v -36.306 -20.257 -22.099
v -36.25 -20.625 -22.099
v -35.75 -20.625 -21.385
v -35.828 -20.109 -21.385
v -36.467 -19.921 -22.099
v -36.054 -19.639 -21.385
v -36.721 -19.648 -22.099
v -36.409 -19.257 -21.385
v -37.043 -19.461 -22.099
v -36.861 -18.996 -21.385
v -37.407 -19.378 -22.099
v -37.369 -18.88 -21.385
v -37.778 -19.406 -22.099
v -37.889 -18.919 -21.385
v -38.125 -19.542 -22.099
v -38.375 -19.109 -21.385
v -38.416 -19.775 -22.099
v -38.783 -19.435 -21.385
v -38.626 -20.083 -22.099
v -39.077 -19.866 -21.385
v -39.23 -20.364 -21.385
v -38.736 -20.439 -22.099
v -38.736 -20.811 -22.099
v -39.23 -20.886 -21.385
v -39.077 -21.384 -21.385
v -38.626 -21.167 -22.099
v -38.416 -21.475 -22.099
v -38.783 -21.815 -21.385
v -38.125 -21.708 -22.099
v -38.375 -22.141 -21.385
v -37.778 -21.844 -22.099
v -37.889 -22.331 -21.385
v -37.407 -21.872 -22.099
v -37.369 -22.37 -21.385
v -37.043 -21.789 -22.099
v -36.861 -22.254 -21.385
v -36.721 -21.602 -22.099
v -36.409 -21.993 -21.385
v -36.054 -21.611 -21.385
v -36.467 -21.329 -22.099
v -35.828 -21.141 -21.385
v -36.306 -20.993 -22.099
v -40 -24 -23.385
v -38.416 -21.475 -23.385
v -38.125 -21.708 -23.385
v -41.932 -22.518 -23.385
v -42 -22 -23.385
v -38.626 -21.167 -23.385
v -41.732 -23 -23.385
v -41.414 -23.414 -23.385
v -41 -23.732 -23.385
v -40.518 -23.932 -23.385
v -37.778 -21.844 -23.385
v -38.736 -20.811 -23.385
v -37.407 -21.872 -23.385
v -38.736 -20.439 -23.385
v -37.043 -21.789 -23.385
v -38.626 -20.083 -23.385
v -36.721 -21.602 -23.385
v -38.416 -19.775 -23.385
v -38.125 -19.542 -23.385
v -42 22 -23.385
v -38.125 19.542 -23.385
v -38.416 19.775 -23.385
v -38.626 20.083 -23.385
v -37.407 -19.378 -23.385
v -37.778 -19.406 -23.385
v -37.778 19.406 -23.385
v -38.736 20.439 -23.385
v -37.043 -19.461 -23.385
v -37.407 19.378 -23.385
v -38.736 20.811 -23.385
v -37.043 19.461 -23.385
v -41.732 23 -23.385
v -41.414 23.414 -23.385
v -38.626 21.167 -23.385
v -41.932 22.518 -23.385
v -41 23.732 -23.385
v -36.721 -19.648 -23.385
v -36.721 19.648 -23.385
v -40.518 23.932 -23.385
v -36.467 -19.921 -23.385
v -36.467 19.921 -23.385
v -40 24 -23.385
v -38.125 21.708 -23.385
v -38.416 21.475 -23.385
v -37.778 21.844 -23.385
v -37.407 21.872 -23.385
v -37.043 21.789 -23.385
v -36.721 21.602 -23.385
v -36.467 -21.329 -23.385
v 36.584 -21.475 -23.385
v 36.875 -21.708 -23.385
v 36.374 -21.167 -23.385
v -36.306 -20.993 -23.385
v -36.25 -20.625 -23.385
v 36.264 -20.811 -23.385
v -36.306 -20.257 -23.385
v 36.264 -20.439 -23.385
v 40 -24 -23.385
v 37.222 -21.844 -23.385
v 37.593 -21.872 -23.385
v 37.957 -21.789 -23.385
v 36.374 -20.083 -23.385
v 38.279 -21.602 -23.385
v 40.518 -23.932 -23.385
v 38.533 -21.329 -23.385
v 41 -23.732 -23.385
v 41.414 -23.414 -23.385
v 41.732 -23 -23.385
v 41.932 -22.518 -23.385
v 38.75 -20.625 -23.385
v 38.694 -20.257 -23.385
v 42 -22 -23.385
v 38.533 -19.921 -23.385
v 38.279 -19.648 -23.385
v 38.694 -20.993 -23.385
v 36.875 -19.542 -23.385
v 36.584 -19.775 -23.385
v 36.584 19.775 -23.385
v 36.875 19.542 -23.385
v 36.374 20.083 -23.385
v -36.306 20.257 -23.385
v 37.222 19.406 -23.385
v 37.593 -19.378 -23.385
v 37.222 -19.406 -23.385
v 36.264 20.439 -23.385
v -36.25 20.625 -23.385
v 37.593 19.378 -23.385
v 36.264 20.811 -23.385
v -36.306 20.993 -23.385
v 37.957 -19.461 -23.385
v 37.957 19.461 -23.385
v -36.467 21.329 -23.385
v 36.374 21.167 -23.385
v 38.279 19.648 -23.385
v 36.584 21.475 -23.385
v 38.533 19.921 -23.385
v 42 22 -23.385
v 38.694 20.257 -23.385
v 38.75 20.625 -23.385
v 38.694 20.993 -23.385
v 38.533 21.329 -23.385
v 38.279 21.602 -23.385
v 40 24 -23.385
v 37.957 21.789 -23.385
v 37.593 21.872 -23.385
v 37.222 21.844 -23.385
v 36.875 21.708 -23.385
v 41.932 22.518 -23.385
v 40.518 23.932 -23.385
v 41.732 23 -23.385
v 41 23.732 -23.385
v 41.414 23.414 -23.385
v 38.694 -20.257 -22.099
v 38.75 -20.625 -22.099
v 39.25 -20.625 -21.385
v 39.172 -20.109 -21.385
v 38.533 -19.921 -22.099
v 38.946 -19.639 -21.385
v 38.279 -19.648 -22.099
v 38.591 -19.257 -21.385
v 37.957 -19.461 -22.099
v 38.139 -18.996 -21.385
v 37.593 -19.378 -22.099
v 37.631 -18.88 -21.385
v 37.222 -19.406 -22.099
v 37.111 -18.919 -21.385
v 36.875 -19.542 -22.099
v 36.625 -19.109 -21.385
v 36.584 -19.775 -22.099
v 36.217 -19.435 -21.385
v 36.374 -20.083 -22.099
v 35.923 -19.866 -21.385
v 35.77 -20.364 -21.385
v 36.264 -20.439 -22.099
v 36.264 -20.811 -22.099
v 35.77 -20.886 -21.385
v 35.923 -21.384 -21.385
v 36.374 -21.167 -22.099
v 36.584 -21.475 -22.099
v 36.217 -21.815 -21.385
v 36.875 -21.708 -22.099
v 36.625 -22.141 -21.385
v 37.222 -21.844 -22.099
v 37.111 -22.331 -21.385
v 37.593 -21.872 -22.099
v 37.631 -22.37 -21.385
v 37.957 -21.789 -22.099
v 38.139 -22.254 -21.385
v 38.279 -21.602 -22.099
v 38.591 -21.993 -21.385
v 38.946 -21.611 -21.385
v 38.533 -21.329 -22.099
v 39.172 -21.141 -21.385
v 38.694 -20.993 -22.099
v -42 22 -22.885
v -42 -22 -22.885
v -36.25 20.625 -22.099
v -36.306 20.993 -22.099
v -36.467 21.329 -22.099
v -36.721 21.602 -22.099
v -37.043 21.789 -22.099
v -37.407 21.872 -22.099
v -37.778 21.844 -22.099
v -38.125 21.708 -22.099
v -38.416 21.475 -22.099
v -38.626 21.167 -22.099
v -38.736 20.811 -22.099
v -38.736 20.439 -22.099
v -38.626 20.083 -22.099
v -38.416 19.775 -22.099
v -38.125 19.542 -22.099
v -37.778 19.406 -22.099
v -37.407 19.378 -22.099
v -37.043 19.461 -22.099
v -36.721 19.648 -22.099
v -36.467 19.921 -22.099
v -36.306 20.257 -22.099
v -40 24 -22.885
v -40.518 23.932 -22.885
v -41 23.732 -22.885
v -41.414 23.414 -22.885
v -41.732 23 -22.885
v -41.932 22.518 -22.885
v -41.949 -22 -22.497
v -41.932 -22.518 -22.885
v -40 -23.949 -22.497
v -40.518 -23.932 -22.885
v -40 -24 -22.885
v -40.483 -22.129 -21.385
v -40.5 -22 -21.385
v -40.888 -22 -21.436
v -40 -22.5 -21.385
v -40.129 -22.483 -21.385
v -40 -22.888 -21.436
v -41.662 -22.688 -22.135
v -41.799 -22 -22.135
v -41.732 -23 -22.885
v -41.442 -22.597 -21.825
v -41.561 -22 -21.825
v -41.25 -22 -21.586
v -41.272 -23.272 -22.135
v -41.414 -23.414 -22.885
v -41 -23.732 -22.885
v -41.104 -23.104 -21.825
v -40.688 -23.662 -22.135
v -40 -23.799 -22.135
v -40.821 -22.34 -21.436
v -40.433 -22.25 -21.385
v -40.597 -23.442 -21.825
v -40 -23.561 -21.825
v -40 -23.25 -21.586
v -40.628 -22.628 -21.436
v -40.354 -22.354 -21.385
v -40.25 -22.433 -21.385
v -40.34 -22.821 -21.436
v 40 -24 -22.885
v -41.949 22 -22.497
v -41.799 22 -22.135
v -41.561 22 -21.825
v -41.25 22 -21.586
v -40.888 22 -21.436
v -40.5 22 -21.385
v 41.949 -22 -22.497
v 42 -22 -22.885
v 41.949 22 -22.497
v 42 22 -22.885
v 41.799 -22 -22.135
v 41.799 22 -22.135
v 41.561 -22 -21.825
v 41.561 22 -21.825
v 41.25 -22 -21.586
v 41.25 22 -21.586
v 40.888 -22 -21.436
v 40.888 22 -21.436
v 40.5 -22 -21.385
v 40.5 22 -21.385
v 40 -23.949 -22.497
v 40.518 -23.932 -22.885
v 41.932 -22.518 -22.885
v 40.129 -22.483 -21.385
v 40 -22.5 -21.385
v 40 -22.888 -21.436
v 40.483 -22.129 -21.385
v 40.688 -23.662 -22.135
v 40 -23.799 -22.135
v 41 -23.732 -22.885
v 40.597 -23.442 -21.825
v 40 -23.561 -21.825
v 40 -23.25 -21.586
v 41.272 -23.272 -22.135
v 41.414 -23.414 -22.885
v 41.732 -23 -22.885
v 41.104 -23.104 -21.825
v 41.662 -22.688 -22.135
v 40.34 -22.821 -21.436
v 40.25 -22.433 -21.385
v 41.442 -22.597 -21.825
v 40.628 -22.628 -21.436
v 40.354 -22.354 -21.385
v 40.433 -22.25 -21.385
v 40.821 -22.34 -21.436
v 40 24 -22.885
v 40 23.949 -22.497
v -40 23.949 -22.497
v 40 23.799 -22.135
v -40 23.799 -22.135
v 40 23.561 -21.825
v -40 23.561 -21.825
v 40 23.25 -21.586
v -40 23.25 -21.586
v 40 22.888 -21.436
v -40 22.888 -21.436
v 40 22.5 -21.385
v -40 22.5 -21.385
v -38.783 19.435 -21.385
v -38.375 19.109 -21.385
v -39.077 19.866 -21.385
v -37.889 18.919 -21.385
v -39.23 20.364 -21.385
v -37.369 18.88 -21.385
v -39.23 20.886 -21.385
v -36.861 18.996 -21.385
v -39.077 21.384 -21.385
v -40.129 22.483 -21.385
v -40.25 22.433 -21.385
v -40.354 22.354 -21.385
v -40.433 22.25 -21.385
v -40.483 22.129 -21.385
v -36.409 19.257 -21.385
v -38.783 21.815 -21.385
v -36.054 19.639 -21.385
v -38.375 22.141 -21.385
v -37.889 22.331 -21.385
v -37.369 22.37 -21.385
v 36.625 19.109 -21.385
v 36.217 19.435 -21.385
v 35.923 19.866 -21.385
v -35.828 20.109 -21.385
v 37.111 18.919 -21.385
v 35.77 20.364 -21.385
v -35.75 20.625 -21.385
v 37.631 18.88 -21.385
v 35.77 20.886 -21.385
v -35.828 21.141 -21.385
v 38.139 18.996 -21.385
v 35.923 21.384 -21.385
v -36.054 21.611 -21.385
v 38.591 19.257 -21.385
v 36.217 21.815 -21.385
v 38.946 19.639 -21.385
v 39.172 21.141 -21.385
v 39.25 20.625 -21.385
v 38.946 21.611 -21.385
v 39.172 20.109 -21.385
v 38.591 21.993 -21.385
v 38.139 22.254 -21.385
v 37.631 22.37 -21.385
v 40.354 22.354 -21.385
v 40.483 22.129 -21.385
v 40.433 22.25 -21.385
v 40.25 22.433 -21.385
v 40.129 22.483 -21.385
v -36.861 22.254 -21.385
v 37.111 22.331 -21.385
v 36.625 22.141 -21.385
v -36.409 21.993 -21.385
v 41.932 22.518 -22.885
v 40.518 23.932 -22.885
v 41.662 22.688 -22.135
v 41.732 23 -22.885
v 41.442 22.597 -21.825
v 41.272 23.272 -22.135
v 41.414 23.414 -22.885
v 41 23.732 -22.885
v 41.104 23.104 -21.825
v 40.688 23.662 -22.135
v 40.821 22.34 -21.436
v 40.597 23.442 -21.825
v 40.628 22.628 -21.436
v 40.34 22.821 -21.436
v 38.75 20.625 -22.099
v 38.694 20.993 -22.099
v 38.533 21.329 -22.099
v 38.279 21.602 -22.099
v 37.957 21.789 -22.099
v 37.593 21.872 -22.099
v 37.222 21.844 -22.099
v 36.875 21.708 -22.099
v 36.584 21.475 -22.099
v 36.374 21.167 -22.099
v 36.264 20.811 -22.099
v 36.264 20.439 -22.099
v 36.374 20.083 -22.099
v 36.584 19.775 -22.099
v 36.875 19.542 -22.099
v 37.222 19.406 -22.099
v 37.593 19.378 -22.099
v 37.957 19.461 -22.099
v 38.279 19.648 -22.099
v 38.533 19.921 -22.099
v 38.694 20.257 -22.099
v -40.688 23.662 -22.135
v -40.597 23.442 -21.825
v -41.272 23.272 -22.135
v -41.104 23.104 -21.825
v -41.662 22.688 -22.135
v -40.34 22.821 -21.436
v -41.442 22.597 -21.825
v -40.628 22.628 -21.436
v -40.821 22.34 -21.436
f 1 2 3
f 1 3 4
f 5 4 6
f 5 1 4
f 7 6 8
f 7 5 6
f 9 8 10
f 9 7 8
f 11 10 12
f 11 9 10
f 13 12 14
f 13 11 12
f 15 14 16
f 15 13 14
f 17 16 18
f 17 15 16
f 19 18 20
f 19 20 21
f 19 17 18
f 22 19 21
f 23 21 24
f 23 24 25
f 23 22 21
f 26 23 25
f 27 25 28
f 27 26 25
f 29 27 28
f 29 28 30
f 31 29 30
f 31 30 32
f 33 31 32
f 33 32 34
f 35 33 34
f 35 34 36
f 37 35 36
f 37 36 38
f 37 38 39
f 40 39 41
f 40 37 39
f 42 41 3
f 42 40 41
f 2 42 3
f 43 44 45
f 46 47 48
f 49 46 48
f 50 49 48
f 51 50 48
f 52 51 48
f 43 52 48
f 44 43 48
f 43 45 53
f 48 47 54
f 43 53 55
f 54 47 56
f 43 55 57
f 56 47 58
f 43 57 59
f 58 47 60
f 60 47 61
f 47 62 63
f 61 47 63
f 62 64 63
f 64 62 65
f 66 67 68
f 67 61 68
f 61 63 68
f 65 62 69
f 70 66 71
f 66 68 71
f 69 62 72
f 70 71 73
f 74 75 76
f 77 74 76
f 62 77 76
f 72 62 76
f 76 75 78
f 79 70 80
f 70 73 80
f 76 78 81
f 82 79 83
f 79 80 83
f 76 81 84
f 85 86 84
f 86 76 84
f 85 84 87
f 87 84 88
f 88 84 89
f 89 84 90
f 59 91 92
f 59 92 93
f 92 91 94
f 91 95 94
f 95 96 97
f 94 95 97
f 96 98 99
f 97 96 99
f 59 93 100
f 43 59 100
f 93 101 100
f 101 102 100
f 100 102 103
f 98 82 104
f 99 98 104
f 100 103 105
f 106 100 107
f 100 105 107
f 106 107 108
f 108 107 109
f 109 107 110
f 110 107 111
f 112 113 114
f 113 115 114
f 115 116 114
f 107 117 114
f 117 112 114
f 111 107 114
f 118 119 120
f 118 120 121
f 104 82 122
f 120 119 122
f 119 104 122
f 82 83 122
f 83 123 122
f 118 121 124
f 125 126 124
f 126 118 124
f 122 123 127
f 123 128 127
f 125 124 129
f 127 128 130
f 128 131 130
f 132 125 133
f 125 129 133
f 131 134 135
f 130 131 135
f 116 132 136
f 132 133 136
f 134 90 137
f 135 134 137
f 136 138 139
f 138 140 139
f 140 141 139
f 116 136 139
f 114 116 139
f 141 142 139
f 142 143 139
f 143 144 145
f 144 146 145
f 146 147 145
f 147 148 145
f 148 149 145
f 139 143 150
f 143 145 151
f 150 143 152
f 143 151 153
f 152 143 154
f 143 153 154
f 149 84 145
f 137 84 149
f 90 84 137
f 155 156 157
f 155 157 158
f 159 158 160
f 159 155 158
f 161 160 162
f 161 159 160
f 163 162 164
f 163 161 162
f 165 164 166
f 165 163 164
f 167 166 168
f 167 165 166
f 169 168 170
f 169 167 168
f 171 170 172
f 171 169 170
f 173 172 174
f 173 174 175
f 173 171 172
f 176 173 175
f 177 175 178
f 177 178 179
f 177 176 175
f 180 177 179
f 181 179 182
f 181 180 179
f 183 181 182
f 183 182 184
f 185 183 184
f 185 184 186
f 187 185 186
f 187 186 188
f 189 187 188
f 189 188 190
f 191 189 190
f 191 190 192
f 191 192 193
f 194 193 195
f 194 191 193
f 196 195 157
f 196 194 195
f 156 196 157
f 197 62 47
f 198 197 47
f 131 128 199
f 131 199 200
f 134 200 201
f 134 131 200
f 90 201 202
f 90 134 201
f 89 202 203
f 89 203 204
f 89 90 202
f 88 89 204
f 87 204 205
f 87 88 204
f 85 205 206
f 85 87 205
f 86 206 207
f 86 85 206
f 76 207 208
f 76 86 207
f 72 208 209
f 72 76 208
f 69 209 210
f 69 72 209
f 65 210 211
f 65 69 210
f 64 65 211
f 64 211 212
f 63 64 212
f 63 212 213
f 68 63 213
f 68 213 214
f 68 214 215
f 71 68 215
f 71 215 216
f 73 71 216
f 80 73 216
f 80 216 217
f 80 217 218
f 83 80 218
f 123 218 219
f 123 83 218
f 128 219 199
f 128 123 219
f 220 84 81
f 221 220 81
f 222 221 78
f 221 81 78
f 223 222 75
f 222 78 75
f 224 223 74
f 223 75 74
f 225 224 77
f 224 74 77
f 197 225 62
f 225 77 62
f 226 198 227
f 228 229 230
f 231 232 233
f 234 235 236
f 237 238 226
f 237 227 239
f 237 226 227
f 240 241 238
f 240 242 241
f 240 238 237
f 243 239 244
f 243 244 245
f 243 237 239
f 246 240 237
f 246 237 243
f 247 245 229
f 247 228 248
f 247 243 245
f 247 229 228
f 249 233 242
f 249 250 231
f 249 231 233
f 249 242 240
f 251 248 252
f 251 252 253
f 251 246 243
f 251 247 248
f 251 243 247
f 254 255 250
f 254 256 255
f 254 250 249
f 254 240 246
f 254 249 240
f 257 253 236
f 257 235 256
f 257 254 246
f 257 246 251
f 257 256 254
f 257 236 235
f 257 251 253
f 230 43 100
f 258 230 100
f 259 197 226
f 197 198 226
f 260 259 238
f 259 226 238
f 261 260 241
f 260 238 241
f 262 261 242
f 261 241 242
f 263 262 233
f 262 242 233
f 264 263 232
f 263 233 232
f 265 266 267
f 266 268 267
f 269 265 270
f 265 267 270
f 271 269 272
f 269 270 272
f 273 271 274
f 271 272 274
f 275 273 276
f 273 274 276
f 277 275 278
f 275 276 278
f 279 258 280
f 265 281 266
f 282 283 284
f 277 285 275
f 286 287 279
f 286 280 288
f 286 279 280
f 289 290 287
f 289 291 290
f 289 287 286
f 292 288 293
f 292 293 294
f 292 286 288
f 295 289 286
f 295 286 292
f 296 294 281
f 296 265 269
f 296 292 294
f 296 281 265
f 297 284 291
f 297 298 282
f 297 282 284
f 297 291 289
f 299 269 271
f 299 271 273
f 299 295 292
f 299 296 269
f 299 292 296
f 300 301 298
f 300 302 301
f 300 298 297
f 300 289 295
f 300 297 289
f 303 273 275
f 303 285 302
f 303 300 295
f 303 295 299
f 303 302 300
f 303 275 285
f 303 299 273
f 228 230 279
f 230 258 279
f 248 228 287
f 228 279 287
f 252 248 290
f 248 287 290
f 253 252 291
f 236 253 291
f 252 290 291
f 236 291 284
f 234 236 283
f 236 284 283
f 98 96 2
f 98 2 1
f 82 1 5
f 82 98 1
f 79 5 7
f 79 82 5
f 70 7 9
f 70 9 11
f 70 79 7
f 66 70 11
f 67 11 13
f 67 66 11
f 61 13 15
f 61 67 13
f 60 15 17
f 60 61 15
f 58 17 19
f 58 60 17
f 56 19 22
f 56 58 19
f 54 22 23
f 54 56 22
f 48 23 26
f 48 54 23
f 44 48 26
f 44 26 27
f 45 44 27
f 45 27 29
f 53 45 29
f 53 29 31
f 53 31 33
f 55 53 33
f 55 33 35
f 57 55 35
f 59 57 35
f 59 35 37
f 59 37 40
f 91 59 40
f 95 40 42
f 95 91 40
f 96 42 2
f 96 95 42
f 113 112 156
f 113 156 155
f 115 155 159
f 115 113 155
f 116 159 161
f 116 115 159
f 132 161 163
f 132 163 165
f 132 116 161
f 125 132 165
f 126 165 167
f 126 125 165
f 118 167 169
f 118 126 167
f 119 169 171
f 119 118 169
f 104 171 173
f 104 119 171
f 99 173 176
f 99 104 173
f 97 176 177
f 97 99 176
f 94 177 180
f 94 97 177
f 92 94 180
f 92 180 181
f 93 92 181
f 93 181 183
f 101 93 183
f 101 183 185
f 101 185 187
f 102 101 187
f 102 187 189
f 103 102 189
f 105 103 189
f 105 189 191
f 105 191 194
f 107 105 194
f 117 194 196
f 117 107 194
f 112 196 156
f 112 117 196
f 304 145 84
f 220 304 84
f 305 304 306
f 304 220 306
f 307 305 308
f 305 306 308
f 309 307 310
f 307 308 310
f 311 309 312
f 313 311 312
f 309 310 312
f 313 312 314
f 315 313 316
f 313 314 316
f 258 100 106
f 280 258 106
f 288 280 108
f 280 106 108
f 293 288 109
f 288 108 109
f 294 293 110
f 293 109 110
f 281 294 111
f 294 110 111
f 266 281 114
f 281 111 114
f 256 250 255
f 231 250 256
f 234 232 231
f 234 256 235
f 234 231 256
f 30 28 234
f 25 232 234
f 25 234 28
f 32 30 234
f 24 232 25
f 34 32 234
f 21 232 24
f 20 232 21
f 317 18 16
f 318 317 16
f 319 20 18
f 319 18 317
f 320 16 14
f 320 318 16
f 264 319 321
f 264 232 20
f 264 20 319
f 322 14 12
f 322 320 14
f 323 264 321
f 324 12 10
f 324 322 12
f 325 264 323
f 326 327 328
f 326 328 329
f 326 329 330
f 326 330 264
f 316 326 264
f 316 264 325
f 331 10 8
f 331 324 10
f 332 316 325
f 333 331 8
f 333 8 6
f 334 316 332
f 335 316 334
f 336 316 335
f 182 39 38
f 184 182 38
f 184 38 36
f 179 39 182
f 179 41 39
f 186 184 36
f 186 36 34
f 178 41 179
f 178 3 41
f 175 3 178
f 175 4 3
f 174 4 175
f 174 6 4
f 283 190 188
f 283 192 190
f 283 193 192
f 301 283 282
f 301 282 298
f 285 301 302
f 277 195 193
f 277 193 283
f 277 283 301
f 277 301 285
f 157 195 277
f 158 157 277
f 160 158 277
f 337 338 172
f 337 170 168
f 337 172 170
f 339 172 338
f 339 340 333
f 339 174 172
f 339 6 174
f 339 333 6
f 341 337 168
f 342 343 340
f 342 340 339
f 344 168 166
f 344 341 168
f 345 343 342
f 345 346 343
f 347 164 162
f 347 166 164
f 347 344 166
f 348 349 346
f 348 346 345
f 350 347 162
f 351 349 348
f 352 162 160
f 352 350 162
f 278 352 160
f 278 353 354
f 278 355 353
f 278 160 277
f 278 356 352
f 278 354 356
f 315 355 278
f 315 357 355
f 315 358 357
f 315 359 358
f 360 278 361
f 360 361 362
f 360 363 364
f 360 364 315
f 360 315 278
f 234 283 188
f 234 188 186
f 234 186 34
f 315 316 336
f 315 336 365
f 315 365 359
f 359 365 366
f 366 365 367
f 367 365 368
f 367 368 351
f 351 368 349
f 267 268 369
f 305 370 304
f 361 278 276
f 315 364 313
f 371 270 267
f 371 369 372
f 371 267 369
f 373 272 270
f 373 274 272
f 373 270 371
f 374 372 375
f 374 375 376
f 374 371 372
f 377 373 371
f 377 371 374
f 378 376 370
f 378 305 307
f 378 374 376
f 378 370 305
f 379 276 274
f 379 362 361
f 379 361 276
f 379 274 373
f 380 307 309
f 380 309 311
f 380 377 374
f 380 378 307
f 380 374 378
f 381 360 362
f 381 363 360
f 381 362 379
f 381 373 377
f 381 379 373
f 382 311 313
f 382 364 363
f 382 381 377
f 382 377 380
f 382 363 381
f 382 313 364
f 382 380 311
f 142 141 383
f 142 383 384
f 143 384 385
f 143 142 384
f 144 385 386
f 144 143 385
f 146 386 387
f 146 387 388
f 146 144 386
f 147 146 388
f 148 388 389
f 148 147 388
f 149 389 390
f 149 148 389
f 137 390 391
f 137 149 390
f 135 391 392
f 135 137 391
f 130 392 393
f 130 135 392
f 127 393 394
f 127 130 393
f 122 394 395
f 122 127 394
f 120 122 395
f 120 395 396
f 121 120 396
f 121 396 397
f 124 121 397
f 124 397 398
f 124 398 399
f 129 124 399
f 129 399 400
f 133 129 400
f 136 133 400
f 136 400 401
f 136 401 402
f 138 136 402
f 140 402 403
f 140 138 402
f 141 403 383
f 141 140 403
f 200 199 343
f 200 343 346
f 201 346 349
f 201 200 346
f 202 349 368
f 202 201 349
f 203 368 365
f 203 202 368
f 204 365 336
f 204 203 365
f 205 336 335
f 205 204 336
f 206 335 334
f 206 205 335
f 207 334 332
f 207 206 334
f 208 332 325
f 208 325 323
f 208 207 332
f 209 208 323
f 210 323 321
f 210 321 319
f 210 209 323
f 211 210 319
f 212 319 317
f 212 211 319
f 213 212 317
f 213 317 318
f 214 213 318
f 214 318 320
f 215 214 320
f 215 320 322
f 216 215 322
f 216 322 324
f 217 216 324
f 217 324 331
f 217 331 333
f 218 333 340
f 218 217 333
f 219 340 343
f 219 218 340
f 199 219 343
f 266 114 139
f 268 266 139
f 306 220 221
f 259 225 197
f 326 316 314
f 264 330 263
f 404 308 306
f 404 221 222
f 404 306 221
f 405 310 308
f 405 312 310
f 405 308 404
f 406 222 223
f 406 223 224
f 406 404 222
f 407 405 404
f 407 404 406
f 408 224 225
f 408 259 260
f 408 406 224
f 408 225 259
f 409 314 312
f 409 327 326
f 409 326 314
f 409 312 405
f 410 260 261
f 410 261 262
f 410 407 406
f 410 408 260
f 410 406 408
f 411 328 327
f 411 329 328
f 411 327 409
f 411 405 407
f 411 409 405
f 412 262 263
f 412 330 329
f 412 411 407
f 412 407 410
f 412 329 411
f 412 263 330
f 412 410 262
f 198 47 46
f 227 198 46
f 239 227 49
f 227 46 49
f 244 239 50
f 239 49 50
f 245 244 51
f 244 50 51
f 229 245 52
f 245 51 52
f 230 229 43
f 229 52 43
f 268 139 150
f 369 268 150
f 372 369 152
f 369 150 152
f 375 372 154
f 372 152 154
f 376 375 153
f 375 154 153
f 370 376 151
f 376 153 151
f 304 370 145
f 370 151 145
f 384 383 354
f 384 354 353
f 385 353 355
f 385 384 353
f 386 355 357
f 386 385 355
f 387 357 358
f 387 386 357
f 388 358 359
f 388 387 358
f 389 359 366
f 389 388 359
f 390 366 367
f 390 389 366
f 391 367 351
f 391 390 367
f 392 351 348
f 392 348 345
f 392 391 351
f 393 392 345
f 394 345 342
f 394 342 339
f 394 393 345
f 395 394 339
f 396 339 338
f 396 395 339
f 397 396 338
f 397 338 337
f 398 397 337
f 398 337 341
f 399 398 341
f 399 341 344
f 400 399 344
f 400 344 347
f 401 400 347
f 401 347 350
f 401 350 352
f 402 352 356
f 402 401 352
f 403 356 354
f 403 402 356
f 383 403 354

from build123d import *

# Parameters (mm, degrees)
SKETCH_2_R      = 1.25
EXTRUDE_1_DEPTH = 2
FILLET_1_R      = 1.5
CHAMFER_1_SIZE  = 0.5
CHAMFER_1_SIZE2 = 0.714074003


with BuildPart() as part:
    # 草图2 → 凸台-拉伸1 (new body)
    with BuildSketch(Plane.XY.offset(-23.385365979)):
        with BuildLine():
            Line((-42, 22), (-42, -22))
            ThreePointArc((-42, -22), (-41.414213562, -23.414213562), (-40, -24))
            Line((-40, -24), (40, -24))
            ThreePointArc((40, -24), (41.414213562, -23.414213562), (42, -22))
            Line((42, -22), (42, 22))
            ThreePointArc((42, 22), (41.414213562, 23.414213562), (40, 24))
            Line((40, 24), (-40, 24))
            ThreePointArc((-40, 24), (-41.414213562, 23.414213562), (-42, 22))
        make_face()
        with Locations((37.5, -20.625)):
            Circle(SKETCH_2_R, mode=Mode.SUBTRACT)
        with Locations((-37.5, -20.625)):
            Circle(SKETCH_2_R, mode=Mode.SUBTRACT)
        with Locations((37.5, 20.625)):
            Circle(SKETCH_2_R, mode=Mode.SUBTRACT)
        with Locations((-37.5, 20.625)):
            Circle(SKETCH_2_R, mode=Mode.SUBTRACT)
    extrude(amount=EXTRUDE_1_DEPTH)

    # 圆角1
    fillet_1_edges = [part.edges().sort_by_distance(p)[0] for p in [
        (-41.414213562, -23.414213562, -21.385365979),
        (0, -24, -21.385365979),
        (41.414213562, -23.414213562, -21.385365979),
        (42, 0, -21.385365979),
        (41.414213562, 23.414213562, -21.385365979),
        (0, 24, -21.385365979),
        (-41.414213562, 23.414213562, -21.385365979),
        (-42, 0, -21.385365979),
    ]]
    fillet(fillet_1_edges, radius=FILLET_1_R)

    # 倒角1
    chamfer_1_edges = [part.edges().sort_by_distance(p)[0] for p in [
        (36.25, -20.625, -21.385365979),
        (-38.75, -20.625, -21.385365979),
        (36.25, 20.625, -21.385365979),
        (-38.75, 20.625, -21.385365979),
    ]]
    chamfer_1_side = [part.faces().sort_by_distance(p)[0] for p in [
        (0, 0, -21.385365979),
    ]]
    chamfer(chamfer_1_edges, length=CHAMFER_1_SIZE, length2=CHAMFER_1_SIZE2, reference=chamfer_1_side[0])


solid = part.part
